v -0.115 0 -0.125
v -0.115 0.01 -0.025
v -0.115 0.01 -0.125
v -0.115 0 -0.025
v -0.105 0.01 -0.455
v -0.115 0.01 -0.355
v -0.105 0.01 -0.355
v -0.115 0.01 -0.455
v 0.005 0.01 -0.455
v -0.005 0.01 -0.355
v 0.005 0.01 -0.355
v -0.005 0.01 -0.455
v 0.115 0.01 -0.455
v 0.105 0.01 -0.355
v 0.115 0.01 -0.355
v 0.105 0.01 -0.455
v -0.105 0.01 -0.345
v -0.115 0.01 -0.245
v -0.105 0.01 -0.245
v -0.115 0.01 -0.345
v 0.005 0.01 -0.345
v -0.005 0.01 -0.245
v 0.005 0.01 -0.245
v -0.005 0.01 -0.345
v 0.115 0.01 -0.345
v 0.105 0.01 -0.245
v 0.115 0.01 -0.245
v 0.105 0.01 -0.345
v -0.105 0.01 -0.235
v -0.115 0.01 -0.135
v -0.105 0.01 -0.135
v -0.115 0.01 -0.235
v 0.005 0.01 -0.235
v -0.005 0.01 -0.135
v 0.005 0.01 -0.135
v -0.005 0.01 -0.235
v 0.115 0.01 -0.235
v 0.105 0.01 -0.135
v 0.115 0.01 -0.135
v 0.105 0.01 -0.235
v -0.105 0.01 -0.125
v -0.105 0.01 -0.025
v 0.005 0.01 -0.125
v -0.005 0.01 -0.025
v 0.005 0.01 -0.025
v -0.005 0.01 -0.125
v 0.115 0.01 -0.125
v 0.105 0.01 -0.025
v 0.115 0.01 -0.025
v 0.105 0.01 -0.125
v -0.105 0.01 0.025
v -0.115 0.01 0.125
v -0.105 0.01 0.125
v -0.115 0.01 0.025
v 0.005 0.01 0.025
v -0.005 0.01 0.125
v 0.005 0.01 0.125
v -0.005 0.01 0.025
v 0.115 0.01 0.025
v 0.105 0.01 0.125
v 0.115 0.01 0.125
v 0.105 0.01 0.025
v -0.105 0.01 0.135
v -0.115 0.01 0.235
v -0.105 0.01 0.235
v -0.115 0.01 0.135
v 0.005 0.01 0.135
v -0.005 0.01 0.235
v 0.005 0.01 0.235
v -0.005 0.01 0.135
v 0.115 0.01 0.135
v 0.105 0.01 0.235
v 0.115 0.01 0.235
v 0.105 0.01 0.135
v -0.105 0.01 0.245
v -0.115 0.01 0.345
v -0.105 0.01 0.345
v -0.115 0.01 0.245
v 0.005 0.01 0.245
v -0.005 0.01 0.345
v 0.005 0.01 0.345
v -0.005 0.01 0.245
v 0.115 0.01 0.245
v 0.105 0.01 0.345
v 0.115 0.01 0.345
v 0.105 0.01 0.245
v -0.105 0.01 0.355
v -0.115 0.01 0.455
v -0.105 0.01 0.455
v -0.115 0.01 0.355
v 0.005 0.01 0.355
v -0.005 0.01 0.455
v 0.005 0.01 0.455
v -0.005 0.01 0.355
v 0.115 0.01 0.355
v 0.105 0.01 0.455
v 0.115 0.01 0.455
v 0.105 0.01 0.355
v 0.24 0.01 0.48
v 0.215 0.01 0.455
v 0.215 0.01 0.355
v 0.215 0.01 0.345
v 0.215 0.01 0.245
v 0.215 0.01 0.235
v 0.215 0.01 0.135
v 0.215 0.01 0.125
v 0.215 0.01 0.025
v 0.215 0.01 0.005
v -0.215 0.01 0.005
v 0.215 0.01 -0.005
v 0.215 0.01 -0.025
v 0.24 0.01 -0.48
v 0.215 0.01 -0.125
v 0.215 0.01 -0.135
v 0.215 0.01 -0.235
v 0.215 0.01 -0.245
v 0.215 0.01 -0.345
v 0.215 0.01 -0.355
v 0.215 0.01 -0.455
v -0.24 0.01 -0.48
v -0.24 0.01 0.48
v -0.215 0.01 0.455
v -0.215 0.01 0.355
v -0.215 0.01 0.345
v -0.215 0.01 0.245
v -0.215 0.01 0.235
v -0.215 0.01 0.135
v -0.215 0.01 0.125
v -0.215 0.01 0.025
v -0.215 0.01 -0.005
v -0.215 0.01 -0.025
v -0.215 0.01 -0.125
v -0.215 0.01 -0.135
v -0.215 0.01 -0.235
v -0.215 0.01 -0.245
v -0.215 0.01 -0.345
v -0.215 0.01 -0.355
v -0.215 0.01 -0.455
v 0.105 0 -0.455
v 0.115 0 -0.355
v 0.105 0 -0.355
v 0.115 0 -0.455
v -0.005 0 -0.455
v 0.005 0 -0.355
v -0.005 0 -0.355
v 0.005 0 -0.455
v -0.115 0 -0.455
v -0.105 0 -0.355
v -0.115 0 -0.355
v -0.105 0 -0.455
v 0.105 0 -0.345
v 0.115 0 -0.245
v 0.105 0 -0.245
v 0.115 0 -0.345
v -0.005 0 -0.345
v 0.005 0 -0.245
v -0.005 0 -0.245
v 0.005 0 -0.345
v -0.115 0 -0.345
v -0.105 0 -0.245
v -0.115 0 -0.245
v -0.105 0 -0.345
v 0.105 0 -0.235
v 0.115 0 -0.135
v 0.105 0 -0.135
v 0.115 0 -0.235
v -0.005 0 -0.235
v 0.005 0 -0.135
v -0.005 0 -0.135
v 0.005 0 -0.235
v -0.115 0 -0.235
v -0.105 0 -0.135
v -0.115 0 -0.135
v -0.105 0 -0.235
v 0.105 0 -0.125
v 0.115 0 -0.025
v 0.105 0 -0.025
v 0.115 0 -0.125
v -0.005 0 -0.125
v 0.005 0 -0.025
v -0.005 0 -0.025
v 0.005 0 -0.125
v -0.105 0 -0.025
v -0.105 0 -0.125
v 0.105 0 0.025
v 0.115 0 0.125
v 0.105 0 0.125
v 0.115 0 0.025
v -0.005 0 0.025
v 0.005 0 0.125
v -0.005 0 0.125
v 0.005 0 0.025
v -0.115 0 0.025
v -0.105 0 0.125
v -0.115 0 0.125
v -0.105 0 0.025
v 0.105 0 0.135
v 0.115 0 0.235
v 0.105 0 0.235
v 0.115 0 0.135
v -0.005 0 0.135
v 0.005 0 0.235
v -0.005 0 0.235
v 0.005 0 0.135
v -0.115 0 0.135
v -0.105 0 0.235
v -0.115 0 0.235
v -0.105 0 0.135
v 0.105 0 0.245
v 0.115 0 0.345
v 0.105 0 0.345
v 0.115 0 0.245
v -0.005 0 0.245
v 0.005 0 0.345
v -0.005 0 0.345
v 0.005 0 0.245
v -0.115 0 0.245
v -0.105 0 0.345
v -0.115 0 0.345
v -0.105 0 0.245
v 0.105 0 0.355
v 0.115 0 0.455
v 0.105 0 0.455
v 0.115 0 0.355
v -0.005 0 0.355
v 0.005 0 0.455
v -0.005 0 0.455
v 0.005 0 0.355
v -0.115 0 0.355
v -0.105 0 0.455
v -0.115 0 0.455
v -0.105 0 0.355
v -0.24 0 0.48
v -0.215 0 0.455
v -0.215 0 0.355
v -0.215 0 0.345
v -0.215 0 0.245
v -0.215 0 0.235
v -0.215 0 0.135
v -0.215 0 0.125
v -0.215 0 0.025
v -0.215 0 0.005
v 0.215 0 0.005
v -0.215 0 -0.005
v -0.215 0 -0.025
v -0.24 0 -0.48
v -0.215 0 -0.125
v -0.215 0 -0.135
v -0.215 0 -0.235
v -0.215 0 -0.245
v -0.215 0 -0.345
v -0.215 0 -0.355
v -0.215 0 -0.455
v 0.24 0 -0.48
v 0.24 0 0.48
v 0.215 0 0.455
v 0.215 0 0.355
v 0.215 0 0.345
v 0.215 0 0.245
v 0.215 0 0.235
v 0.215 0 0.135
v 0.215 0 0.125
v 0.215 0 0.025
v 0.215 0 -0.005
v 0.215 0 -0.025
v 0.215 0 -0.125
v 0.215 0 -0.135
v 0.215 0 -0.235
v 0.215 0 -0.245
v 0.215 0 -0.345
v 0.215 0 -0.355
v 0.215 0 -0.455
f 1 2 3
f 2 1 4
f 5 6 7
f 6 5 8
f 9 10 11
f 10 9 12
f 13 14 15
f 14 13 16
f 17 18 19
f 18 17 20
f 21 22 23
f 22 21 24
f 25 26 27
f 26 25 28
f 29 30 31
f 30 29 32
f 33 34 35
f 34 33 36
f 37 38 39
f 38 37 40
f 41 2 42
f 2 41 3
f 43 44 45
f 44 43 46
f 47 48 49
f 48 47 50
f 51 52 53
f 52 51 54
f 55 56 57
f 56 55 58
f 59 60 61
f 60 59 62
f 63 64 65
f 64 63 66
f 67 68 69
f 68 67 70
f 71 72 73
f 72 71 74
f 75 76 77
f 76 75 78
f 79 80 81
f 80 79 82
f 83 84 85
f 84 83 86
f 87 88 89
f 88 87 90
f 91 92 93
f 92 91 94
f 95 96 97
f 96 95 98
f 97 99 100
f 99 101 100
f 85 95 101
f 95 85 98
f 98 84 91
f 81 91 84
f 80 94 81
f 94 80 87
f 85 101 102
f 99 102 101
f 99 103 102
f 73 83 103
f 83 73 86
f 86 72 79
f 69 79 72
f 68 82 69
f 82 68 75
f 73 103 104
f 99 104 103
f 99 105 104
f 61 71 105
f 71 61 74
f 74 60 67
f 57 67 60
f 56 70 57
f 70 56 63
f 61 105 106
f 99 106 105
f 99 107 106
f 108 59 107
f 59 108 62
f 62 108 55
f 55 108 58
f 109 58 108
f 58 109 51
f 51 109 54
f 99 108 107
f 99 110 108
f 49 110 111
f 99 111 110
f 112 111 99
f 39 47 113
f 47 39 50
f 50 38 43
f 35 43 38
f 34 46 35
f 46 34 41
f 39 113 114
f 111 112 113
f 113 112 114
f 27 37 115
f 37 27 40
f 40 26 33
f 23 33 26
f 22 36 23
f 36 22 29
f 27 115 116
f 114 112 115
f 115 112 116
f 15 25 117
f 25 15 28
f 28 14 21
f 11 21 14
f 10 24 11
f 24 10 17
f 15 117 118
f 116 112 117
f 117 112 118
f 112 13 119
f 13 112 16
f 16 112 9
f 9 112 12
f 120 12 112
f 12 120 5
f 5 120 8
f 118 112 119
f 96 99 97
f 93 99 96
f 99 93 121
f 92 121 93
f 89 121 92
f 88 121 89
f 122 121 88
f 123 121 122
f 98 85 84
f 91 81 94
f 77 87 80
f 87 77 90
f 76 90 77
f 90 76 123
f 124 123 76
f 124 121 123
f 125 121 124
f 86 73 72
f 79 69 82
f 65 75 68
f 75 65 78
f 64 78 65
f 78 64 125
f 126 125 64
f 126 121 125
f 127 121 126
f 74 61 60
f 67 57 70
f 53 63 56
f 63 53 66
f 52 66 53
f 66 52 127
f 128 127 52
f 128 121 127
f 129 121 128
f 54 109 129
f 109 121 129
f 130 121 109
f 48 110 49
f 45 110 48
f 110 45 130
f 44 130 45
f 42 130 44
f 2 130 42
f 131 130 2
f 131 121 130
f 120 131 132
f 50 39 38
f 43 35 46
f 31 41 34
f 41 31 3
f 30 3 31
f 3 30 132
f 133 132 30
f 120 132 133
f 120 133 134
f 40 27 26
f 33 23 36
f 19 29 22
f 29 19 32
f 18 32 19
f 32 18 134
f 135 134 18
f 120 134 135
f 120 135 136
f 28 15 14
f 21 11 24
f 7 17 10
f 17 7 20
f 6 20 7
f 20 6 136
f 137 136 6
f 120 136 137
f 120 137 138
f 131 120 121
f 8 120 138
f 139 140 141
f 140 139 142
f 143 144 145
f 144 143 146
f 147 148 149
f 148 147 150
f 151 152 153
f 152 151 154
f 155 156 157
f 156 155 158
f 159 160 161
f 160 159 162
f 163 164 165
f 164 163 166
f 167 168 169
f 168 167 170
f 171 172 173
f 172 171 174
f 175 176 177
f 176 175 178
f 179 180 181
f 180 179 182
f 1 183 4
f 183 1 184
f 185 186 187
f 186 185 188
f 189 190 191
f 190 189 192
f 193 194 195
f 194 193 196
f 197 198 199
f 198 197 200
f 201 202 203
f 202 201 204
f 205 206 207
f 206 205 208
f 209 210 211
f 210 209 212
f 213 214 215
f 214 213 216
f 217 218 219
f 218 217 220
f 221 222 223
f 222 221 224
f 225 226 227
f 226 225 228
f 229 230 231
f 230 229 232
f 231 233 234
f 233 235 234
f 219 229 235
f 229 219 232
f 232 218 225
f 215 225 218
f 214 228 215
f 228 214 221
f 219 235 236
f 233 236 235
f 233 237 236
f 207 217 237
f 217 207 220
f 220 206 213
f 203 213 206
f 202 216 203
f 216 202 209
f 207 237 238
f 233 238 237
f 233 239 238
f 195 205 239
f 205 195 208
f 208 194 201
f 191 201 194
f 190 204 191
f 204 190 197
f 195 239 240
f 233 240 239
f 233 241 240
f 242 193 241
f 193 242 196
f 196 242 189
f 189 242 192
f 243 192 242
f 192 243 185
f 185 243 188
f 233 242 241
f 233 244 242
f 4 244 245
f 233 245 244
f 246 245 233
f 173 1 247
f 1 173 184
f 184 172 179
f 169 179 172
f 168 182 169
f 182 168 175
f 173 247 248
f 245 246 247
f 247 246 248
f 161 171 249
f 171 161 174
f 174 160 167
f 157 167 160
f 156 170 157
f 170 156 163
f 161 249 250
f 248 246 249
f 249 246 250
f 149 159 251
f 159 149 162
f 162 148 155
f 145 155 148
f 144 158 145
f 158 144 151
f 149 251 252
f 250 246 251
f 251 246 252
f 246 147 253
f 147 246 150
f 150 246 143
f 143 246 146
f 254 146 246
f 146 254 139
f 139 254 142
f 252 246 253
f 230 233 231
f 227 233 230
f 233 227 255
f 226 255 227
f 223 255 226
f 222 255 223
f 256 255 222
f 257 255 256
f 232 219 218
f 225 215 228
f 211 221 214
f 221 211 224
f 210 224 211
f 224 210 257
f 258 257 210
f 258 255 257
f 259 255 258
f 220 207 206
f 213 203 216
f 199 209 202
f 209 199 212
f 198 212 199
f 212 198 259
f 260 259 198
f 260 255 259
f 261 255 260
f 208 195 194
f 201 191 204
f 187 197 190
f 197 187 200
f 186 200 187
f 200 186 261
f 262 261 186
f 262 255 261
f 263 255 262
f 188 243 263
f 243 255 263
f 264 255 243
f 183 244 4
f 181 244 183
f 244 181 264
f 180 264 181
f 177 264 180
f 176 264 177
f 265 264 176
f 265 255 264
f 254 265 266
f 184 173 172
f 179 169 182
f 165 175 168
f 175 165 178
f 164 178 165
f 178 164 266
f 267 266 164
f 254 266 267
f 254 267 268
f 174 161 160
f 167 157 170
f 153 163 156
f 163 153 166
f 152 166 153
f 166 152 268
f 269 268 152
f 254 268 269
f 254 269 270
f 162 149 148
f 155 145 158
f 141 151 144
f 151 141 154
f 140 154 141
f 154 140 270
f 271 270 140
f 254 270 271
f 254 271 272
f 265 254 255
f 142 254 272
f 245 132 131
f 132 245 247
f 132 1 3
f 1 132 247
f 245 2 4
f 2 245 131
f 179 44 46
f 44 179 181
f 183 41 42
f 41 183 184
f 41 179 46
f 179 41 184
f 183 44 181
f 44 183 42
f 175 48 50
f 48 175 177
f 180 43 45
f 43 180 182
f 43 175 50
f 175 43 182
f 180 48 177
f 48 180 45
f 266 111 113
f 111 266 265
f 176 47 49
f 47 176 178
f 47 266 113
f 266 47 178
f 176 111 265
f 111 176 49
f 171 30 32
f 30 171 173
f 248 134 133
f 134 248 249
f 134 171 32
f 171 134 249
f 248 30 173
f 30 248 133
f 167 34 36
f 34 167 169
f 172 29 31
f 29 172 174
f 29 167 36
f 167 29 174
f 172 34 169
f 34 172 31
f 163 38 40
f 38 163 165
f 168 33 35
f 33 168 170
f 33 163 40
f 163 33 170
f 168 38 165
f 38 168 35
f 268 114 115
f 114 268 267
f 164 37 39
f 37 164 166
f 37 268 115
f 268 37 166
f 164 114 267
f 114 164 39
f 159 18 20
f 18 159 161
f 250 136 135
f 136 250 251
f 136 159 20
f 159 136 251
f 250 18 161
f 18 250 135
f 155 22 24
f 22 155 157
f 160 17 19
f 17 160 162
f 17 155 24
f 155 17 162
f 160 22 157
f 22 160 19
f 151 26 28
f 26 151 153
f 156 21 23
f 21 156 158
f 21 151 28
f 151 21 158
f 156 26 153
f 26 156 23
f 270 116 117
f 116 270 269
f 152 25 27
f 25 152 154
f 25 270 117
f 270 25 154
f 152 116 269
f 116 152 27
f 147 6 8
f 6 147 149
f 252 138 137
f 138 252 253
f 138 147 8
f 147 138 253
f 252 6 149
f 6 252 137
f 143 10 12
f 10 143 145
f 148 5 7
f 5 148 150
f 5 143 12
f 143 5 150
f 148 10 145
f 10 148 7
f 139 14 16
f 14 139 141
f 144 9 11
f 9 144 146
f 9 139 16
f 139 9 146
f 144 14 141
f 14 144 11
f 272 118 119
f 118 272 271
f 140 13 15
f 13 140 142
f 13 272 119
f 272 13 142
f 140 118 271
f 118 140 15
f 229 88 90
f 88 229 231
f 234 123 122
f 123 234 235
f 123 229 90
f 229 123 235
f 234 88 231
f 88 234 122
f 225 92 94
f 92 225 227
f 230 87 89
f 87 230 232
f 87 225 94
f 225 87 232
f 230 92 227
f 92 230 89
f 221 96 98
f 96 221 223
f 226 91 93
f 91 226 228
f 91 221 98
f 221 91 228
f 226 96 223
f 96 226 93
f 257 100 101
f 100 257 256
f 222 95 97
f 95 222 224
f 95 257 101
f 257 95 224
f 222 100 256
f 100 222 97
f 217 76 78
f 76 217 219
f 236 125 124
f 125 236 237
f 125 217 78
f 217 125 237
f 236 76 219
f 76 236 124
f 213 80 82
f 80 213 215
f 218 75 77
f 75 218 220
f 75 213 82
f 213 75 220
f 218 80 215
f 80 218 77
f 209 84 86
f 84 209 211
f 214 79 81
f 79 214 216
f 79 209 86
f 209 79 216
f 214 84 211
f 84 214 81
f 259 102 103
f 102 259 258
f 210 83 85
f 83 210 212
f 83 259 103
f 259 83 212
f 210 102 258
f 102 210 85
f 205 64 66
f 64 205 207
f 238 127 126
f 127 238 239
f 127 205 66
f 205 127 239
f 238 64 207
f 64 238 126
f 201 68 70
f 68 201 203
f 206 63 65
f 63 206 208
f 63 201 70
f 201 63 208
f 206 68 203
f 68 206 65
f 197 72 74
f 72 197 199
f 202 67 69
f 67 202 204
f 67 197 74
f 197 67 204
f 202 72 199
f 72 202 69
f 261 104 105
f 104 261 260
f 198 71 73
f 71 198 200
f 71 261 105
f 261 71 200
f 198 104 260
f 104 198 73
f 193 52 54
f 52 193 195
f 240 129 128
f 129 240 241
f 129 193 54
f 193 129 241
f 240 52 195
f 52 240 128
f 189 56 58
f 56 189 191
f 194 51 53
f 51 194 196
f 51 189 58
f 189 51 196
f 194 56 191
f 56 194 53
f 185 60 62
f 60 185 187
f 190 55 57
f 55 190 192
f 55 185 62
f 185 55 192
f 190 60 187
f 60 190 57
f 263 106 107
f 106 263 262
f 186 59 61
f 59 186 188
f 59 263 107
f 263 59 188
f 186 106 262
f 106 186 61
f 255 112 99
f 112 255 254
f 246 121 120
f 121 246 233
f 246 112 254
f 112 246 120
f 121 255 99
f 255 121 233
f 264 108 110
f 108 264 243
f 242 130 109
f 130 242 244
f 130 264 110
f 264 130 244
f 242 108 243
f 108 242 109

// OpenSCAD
// Martian Chess board
//
// A slotted board, with two separate 4x4 grids, shaped for Icehouse pieces.
// This is comprised of two meshes; a flat bottom part and a cutout top part,
// for different materials.

Model = "Top"; // [Top, Bottom]

rotate([ -90, 0, 0 ]) {
    if (Model == "Top") {
        translate([ 0, 0, 0.005 ]) difference() {
            cube(
                [
                    0.1 * 4 + 0.01 * (4 - 1) + 0.025 * 2,
                    0.1 * 8 + 0.01 * (8 - 1) + 0.025 * 2 + 0.04, 0.01
                ],
                center = true);
            for (y = [0:3]) {
                for (x = [0:3]) {
                    translate([
                        -(0.1 * 4 + 0.01 * (4 - 1)) / 2 + 0.11 * x + 0.05,
                        0.02 + 0.055 + 0.11 * y, 0
                    ]) {
                        cube([ 0.1, 0.1, 0.01 ], center = true);
                    }
                }
            }
            for (y = [0:3]) {
                for (x = [0:3]) {
                    translate([
                        -(0.1 * 4 + 0.01 * (4 - 1)) / 2 + 0.11 * x + 0.05,
                        0.01 - 0.03 - 0.11 * 4 + 0.055 + 0.11 * y, 0
                    ]) {
                        cube([ 0.1, 0.1, 0.01 ], center = true);
                    }
                }
            }
            cube([ 0.1 * 4 + 0.01 * (4 - 1), 0.01, 0.01 ], center = true);
        }
    } else if (Model == "Bottom") {
        translate([ 0, 0, -0.005 ]) cube(
            [
                0.1 * 4 + 0.01 * (4 - 1) + 0.025 * 2,
                0.1 * 8 + 0.01 * (8 - 1) + 0.025 * 2 + 0.03, 0.01
            ],
            center = true);
    }
}
